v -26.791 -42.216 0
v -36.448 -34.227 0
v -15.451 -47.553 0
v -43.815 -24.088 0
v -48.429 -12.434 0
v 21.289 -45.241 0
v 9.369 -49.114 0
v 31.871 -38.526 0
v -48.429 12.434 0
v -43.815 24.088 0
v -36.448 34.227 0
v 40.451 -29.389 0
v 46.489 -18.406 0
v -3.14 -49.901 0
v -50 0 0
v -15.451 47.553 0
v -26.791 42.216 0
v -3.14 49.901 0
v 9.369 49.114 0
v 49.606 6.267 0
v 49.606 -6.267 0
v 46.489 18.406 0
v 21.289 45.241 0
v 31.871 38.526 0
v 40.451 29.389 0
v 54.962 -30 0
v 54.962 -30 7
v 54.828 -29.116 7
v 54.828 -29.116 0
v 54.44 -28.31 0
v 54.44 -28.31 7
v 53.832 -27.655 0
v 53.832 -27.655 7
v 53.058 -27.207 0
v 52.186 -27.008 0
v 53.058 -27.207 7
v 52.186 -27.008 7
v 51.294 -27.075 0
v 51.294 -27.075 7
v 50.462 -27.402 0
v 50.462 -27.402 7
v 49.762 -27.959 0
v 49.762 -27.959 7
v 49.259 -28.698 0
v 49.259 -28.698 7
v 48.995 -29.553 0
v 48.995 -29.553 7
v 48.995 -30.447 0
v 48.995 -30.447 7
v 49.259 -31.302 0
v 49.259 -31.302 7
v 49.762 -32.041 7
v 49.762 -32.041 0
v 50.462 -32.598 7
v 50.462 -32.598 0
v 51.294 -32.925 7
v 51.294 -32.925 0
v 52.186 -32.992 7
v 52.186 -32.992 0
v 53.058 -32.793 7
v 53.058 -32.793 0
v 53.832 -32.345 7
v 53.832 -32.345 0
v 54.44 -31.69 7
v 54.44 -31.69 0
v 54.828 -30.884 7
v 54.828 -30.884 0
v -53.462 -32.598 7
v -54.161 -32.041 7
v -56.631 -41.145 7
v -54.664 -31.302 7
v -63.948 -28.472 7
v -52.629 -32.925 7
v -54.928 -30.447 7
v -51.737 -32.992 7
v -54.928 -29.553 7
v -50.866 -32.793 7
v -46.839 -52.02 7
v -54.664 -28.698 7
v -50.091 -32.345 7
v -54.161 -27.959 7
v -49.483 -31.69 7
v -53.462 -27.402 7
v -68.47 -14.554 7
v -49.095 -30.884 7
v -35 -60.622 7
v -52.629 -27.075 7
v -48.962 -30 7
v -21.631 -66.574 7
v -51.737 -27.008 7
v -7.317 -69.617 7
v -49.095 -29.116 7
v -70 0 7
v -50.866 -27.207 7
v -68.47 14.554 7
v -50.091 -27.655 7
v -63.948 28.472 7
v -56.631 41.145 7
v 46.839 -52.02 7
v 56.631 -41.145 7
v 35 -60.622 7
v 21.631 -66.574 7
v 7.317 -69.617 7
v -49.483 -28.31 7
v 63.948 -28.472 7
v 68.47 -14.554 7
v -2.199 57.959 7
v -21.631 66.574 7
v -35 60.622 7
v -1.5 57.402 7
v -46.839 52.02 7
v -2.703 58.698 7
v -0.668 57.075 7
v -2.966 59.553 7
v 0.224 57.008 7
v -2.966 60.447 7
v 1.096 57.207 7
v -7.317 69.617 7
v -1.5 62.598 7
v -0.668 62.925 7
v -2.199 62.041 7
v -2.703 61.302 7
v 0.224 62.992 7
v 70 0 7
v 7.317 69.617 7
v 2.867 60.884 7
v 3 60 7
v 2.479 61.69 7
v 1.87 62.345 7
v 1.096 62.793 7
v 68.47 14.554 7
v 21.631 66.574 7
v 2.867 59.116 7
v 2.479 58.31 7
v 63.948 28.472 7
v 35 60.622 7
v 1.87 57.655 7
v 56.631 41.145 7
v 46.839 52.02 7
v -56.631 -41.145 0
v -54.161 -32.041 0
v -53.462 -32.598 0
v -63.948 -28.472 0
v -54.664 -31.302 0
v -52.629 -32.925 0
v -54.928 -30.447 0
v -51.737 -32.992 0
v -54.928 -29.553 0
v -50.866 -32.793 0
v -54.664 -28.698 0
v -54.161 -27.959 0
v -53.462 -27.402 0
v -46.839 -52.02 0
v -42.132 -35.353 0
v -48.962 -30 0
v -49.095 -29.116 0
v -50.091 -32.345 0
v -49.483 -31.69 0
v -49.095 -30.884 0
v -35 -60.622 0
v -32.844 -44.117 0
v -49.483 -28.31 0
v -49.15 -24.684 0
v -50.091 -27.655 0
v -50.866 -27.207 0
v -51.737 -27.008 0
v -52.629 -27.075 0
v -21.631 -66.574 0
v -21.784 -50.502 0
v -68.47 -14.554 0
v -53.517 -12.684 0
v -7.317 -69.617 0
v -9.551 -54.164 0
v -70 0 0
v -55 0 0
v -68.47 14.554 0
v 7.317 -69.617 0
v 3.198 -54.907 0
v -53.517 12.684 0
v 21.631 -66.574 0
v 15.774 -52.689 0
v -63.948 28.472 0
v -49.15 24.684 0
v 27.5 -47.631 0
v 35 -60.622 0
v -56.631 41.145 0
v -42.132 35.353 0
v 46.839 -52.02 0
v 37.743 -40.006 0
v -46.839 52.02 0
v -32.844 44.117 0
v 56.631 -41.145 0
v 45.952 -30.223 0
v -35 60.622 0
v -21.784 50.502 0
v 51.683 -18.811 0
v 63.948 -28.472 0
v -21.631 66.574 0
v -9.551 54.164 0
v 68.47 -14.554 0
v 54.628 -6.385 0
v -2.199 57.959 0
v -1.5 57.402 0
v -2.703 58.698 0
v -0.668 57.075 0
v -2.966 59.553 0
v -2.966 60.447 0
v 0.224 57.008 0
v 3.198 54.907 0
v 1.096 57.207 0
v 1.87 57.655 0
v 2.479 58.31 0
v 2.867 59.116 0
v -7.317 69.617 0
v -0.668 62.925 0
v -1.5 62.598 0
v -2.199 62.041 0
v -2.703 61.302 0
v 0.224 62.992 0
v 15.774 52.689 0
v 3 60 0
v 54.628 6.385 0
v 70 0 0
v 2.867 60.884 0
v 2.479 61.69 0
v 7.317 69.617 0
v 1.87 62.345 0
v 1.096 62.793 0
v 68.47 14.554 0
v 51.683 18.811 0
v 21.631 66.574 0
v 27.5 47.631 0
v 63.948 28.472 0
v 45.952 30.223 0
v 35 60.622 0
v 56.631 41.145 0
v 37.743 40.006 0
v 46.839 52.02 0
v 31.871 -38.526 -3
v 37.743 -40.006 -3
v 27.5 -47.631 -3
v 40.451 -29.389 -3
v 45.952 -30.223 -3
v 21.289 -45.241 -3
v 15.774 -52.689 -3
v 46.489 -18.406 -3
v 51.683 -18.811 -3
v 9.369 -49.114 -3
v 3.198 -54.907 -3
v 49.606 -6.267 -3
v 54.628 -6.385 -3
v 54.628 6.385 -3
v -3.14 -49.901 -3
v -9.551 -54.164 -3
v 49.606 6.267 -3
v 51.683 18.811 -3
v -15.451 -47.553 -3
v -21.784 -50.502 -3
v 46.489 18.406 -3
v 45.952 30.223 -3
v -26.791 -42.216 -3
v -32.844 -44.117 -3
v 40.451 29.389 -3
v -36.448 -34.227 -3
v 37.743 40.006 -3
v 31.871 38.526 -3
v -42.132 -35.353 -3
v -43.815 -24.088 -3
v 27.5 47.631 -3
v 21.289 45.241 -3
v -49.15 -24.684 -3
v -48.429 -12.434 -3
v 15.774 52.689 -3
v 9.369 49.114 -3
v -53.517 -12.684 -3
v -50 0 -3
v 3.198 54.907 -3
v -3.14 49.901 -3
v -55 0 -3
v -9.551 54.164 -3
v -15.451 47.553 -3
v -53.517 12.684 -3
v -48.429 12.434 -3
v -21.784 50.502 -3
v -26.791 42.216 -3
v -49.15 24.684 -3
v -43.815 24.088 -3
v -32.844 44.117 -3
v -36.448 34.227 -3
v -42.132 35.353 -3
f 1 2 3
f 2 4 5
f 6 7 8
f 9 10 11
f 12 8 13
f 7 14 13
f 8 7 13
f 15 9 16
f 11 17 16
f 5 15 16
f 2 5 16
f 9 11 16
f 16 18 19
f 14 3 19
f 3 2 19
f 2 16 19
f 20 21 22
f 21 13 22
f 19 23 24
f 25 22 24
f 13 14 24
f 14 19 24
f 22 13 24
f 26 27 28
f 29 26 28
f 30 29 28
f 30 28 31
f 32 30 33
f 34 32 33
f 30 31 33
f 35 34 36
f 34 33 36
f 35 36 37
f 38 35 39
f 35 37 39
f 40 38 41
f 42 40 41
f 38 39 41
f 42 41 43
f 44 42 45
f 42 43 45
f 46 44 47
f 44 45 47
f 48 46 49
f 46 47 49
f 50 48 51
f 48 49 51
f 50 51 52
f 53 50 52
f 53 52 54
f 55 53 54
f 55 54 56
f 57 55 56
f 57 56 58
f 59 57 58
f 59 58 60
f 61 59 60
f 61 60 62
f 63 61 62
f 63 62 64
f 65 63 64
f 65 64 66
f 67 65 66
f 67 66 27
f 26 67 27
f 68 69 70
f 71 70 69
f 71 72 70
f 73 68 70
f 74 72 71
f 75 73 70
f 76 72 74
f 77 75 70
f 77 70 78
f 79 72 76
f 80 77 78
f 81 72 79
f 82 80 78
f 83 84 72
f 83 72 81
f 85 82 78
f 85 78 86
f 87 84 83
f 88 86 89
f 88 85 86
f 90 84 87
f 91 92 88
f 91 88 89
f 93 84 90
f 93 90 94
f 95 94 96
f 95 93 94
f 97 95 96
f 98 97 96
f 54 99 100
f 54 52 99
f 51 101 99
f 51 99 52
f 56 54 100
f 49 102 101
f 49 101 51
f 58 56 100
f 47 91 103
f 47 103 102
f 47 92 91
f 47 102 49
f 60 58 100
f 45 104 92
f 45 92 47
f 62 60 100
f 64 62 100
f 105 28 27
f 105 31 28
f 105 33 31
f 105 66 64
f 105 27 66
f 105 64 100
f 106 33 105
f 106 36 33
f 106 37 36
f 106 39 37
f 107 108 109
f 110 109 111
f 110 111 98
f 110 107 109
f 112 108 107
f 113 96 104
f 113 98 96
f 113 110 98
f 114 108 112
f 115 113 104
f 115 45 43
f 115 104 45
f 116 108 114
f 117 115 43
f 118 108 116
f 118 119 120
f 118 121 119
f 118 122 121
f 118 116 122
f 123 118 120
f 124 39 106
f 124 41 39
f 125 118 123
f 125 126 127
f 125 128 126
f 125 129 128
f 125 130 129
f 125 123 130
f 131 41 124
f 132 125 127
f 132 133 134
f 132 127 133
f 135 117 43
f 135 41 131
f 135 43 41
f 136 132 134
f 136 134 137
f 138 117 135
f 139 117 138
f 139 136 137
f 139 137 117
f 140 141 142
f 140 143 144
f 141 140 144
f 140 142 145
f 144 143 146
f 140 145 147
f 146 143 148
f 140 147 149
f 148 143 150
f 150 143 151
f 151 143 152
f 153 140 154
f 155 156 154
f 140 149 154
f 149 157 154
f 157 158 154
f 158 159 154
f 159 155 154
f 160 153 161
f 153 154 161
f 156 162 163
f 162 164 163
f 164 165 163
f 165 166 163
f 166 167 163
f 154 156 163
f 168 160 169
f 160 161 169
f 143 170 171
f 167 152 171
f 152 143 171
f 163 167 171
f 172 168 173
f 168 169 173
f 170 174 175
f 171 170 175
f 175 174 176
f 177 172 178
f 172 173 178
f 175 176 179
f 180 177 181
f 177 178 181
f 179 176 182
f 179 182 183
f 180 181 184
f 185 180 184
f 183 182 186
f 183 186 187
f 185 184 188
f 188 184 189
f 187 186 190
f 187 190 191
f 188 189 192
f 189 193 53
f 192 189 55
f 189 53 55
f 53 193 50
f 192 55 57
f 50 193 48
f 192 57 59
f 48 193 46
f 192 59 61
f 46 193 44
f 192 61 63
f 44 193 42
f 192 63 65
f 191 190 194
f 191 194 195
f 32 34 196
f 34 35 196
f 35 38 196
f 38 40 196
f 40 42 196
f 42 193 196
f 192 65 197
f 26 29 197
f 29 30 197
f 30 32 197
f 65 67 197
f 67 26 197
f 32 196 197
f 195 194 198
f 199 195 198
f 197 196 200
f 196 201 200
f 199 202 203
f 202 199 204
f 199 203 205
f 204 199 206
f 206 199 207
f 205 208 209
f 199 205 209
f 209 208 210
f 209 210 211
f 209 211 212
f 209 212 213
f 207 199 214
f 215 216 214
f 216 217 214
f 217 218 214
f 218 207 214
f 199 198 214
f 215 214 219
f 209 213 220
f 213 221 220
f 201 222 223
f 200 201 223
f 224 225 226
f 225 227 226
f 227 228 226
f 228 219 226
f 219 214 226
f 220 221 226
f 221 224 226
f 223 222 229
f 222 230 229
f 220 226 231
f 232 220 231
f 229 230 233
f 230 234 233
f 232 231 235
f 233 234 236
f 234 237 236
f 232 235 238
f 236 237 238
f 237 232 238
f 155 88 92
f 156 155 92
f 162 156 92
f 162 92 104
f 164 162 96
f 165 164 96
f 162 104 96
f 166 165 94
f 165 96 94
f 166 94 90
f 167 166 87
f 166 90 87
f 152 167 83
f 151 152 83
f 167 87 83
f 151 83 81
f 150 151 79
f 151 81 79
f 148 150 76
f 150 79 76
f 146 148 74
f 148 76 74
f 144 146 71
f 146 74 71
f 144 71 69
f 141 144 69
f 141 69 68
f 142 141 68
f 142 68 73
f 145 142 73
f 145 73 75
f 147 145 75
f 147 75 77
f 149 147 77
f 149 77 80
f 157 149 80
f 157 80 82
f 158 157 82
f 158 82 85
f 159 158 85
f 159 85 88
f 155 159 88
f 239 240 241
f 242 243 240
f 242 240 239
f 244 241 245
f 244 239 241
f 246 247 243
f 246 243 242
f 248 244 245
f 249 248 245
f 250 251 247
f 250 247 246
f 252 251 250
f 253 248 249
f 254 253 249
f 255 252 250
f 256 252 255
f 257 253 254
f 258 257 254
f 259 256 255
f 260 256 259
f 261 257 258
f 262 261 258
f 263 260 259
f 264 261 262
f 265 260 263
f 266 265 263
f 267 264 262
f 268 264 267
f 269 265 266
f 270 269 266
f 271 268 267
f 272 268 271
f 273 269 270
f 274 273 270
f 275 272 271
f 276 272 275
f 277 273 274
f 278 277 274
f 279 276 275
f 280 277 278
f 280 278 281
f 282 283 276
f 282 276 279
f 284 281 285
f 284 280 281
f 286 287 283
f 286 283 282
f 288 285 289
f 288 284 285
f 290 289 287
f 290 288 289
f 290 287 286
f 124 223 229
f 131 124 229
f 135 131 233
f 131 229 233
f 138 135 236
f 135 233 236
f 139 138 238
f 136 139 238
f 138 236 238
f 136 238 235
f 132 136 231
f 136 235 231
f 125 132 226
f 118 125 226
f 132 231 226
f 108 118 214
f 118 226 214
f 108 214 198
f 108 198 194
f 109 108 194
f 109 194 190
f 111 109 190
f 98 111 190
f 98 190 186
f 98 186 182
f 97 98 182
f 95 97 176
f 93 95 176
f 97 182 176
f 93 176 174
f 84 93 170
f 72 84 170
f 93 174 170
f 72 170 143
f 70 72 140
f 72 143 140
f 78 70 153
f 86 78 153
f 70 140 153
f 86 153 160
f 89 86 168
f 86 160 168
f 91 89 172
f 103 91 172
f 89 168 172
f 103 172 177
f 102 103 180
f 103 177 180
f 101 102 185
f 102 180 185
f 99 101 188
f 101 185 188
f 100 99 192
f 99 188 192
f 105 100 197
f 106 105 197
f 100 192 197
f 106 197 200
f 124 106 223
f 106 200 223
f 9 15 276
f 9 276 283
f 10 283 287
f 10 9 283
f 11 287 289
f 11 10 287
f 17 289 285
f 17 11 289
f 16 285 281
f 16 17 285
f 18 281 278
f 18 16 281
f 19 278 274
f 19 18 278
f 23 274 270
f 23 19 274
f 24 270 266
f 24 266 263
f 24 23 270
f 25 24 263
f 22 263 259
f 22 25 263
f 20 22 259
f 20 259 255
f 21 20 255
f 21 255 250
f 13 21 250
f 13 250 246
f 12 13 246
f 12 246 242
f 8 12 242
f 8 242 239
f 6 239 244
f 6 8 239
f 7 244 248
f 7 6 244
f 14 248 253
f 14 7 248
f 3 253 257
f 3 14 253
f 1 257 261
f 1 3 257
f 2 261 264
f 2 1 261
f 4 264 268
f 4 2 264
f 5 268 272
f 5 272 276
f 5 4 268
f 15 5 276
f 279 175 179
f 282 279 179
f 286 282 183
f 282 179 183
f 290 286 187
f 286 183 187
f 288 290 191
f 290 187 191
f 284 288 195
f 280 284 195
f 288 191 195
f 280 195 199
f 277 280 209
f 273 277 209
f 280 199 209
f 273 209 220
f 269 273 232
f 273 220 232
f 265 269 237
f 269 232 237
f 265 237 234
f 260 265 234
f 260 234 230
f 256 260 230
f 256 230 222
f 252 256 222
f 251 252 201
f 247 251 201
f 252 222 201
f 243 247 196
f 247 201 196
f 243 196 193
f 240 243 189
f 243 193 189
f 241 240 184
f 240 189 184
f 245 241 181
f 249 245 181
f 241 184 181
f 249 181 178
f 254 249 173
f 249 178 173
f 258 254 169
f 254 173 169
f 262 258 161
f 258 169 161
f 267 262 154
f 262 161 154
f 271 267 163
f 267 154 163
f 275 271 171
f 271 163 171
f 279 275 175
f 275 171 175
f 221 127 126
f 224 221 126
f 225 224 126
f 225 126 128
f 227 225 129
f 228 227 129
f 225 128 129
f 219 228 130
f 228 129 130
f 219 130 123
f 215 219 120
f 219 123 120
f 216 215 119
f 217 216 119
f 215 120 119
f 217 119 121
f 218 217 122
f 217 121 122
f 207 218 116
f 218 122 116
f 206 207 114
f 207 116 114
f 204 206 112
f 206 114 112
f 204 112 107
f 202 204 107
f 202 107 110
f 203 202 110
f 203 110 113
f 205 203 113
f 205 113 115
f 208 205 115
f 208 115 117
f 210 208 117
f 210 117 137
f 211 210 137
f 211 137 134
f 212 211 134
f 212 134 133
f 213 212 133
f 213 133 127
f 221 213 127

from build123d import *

# Parameters (mm, degrees)
SKETCH1_R           = 70
BOSS_EXTRUDE1_DEPTH = 7
SKETCH2_R           = 55
SKETCH2_R_2         = 50
BOSS_EXTRUDE2_DEPTH = 3
SKETCH3_R           = 3
CUT_EXTRUDE1_DEPTH  = 11


with BuildPart() as part:
    # Sketch1 → Boss-Extrude1 (new body)
    with BuildSketch(Plane.XY):
        Circle(SKETCH1_R)
    extrude(amount=BOSS_EXTRUDE1_DEPTH)

    # Sketch2 → Boss-Extrude2 (add)
    with BuildSketch(Plane(origin=(0, 0, 0), x_dir=(-1, 0, 0), z_dir=(0, 0, -1))):
        Circle(SKETCH2_R)
        Circle(SKETCH2_R_2, mode=Mode.SUBTRACT)
    extrude(amount=BOSS_EXTRUDE2_DEPTH)

    # Sketch3 → Cut-Extrude1 (cut, through all)
    with BuildSketch(Plane.XY.offset(7)):
        with Locations((0, 60)):
            Circle(SKETCH3_R)
        with Locations((51.961524227, -30)):
            Circle(SKETCH3_R)
        with Locations((-51.961524227, -30)):
            Circle(SKETCH3_R)
    extrude(amount=-CUT_EXTRUDE1_DEPTH, mode=Mode.SUBTRACT)


solid = part.part
